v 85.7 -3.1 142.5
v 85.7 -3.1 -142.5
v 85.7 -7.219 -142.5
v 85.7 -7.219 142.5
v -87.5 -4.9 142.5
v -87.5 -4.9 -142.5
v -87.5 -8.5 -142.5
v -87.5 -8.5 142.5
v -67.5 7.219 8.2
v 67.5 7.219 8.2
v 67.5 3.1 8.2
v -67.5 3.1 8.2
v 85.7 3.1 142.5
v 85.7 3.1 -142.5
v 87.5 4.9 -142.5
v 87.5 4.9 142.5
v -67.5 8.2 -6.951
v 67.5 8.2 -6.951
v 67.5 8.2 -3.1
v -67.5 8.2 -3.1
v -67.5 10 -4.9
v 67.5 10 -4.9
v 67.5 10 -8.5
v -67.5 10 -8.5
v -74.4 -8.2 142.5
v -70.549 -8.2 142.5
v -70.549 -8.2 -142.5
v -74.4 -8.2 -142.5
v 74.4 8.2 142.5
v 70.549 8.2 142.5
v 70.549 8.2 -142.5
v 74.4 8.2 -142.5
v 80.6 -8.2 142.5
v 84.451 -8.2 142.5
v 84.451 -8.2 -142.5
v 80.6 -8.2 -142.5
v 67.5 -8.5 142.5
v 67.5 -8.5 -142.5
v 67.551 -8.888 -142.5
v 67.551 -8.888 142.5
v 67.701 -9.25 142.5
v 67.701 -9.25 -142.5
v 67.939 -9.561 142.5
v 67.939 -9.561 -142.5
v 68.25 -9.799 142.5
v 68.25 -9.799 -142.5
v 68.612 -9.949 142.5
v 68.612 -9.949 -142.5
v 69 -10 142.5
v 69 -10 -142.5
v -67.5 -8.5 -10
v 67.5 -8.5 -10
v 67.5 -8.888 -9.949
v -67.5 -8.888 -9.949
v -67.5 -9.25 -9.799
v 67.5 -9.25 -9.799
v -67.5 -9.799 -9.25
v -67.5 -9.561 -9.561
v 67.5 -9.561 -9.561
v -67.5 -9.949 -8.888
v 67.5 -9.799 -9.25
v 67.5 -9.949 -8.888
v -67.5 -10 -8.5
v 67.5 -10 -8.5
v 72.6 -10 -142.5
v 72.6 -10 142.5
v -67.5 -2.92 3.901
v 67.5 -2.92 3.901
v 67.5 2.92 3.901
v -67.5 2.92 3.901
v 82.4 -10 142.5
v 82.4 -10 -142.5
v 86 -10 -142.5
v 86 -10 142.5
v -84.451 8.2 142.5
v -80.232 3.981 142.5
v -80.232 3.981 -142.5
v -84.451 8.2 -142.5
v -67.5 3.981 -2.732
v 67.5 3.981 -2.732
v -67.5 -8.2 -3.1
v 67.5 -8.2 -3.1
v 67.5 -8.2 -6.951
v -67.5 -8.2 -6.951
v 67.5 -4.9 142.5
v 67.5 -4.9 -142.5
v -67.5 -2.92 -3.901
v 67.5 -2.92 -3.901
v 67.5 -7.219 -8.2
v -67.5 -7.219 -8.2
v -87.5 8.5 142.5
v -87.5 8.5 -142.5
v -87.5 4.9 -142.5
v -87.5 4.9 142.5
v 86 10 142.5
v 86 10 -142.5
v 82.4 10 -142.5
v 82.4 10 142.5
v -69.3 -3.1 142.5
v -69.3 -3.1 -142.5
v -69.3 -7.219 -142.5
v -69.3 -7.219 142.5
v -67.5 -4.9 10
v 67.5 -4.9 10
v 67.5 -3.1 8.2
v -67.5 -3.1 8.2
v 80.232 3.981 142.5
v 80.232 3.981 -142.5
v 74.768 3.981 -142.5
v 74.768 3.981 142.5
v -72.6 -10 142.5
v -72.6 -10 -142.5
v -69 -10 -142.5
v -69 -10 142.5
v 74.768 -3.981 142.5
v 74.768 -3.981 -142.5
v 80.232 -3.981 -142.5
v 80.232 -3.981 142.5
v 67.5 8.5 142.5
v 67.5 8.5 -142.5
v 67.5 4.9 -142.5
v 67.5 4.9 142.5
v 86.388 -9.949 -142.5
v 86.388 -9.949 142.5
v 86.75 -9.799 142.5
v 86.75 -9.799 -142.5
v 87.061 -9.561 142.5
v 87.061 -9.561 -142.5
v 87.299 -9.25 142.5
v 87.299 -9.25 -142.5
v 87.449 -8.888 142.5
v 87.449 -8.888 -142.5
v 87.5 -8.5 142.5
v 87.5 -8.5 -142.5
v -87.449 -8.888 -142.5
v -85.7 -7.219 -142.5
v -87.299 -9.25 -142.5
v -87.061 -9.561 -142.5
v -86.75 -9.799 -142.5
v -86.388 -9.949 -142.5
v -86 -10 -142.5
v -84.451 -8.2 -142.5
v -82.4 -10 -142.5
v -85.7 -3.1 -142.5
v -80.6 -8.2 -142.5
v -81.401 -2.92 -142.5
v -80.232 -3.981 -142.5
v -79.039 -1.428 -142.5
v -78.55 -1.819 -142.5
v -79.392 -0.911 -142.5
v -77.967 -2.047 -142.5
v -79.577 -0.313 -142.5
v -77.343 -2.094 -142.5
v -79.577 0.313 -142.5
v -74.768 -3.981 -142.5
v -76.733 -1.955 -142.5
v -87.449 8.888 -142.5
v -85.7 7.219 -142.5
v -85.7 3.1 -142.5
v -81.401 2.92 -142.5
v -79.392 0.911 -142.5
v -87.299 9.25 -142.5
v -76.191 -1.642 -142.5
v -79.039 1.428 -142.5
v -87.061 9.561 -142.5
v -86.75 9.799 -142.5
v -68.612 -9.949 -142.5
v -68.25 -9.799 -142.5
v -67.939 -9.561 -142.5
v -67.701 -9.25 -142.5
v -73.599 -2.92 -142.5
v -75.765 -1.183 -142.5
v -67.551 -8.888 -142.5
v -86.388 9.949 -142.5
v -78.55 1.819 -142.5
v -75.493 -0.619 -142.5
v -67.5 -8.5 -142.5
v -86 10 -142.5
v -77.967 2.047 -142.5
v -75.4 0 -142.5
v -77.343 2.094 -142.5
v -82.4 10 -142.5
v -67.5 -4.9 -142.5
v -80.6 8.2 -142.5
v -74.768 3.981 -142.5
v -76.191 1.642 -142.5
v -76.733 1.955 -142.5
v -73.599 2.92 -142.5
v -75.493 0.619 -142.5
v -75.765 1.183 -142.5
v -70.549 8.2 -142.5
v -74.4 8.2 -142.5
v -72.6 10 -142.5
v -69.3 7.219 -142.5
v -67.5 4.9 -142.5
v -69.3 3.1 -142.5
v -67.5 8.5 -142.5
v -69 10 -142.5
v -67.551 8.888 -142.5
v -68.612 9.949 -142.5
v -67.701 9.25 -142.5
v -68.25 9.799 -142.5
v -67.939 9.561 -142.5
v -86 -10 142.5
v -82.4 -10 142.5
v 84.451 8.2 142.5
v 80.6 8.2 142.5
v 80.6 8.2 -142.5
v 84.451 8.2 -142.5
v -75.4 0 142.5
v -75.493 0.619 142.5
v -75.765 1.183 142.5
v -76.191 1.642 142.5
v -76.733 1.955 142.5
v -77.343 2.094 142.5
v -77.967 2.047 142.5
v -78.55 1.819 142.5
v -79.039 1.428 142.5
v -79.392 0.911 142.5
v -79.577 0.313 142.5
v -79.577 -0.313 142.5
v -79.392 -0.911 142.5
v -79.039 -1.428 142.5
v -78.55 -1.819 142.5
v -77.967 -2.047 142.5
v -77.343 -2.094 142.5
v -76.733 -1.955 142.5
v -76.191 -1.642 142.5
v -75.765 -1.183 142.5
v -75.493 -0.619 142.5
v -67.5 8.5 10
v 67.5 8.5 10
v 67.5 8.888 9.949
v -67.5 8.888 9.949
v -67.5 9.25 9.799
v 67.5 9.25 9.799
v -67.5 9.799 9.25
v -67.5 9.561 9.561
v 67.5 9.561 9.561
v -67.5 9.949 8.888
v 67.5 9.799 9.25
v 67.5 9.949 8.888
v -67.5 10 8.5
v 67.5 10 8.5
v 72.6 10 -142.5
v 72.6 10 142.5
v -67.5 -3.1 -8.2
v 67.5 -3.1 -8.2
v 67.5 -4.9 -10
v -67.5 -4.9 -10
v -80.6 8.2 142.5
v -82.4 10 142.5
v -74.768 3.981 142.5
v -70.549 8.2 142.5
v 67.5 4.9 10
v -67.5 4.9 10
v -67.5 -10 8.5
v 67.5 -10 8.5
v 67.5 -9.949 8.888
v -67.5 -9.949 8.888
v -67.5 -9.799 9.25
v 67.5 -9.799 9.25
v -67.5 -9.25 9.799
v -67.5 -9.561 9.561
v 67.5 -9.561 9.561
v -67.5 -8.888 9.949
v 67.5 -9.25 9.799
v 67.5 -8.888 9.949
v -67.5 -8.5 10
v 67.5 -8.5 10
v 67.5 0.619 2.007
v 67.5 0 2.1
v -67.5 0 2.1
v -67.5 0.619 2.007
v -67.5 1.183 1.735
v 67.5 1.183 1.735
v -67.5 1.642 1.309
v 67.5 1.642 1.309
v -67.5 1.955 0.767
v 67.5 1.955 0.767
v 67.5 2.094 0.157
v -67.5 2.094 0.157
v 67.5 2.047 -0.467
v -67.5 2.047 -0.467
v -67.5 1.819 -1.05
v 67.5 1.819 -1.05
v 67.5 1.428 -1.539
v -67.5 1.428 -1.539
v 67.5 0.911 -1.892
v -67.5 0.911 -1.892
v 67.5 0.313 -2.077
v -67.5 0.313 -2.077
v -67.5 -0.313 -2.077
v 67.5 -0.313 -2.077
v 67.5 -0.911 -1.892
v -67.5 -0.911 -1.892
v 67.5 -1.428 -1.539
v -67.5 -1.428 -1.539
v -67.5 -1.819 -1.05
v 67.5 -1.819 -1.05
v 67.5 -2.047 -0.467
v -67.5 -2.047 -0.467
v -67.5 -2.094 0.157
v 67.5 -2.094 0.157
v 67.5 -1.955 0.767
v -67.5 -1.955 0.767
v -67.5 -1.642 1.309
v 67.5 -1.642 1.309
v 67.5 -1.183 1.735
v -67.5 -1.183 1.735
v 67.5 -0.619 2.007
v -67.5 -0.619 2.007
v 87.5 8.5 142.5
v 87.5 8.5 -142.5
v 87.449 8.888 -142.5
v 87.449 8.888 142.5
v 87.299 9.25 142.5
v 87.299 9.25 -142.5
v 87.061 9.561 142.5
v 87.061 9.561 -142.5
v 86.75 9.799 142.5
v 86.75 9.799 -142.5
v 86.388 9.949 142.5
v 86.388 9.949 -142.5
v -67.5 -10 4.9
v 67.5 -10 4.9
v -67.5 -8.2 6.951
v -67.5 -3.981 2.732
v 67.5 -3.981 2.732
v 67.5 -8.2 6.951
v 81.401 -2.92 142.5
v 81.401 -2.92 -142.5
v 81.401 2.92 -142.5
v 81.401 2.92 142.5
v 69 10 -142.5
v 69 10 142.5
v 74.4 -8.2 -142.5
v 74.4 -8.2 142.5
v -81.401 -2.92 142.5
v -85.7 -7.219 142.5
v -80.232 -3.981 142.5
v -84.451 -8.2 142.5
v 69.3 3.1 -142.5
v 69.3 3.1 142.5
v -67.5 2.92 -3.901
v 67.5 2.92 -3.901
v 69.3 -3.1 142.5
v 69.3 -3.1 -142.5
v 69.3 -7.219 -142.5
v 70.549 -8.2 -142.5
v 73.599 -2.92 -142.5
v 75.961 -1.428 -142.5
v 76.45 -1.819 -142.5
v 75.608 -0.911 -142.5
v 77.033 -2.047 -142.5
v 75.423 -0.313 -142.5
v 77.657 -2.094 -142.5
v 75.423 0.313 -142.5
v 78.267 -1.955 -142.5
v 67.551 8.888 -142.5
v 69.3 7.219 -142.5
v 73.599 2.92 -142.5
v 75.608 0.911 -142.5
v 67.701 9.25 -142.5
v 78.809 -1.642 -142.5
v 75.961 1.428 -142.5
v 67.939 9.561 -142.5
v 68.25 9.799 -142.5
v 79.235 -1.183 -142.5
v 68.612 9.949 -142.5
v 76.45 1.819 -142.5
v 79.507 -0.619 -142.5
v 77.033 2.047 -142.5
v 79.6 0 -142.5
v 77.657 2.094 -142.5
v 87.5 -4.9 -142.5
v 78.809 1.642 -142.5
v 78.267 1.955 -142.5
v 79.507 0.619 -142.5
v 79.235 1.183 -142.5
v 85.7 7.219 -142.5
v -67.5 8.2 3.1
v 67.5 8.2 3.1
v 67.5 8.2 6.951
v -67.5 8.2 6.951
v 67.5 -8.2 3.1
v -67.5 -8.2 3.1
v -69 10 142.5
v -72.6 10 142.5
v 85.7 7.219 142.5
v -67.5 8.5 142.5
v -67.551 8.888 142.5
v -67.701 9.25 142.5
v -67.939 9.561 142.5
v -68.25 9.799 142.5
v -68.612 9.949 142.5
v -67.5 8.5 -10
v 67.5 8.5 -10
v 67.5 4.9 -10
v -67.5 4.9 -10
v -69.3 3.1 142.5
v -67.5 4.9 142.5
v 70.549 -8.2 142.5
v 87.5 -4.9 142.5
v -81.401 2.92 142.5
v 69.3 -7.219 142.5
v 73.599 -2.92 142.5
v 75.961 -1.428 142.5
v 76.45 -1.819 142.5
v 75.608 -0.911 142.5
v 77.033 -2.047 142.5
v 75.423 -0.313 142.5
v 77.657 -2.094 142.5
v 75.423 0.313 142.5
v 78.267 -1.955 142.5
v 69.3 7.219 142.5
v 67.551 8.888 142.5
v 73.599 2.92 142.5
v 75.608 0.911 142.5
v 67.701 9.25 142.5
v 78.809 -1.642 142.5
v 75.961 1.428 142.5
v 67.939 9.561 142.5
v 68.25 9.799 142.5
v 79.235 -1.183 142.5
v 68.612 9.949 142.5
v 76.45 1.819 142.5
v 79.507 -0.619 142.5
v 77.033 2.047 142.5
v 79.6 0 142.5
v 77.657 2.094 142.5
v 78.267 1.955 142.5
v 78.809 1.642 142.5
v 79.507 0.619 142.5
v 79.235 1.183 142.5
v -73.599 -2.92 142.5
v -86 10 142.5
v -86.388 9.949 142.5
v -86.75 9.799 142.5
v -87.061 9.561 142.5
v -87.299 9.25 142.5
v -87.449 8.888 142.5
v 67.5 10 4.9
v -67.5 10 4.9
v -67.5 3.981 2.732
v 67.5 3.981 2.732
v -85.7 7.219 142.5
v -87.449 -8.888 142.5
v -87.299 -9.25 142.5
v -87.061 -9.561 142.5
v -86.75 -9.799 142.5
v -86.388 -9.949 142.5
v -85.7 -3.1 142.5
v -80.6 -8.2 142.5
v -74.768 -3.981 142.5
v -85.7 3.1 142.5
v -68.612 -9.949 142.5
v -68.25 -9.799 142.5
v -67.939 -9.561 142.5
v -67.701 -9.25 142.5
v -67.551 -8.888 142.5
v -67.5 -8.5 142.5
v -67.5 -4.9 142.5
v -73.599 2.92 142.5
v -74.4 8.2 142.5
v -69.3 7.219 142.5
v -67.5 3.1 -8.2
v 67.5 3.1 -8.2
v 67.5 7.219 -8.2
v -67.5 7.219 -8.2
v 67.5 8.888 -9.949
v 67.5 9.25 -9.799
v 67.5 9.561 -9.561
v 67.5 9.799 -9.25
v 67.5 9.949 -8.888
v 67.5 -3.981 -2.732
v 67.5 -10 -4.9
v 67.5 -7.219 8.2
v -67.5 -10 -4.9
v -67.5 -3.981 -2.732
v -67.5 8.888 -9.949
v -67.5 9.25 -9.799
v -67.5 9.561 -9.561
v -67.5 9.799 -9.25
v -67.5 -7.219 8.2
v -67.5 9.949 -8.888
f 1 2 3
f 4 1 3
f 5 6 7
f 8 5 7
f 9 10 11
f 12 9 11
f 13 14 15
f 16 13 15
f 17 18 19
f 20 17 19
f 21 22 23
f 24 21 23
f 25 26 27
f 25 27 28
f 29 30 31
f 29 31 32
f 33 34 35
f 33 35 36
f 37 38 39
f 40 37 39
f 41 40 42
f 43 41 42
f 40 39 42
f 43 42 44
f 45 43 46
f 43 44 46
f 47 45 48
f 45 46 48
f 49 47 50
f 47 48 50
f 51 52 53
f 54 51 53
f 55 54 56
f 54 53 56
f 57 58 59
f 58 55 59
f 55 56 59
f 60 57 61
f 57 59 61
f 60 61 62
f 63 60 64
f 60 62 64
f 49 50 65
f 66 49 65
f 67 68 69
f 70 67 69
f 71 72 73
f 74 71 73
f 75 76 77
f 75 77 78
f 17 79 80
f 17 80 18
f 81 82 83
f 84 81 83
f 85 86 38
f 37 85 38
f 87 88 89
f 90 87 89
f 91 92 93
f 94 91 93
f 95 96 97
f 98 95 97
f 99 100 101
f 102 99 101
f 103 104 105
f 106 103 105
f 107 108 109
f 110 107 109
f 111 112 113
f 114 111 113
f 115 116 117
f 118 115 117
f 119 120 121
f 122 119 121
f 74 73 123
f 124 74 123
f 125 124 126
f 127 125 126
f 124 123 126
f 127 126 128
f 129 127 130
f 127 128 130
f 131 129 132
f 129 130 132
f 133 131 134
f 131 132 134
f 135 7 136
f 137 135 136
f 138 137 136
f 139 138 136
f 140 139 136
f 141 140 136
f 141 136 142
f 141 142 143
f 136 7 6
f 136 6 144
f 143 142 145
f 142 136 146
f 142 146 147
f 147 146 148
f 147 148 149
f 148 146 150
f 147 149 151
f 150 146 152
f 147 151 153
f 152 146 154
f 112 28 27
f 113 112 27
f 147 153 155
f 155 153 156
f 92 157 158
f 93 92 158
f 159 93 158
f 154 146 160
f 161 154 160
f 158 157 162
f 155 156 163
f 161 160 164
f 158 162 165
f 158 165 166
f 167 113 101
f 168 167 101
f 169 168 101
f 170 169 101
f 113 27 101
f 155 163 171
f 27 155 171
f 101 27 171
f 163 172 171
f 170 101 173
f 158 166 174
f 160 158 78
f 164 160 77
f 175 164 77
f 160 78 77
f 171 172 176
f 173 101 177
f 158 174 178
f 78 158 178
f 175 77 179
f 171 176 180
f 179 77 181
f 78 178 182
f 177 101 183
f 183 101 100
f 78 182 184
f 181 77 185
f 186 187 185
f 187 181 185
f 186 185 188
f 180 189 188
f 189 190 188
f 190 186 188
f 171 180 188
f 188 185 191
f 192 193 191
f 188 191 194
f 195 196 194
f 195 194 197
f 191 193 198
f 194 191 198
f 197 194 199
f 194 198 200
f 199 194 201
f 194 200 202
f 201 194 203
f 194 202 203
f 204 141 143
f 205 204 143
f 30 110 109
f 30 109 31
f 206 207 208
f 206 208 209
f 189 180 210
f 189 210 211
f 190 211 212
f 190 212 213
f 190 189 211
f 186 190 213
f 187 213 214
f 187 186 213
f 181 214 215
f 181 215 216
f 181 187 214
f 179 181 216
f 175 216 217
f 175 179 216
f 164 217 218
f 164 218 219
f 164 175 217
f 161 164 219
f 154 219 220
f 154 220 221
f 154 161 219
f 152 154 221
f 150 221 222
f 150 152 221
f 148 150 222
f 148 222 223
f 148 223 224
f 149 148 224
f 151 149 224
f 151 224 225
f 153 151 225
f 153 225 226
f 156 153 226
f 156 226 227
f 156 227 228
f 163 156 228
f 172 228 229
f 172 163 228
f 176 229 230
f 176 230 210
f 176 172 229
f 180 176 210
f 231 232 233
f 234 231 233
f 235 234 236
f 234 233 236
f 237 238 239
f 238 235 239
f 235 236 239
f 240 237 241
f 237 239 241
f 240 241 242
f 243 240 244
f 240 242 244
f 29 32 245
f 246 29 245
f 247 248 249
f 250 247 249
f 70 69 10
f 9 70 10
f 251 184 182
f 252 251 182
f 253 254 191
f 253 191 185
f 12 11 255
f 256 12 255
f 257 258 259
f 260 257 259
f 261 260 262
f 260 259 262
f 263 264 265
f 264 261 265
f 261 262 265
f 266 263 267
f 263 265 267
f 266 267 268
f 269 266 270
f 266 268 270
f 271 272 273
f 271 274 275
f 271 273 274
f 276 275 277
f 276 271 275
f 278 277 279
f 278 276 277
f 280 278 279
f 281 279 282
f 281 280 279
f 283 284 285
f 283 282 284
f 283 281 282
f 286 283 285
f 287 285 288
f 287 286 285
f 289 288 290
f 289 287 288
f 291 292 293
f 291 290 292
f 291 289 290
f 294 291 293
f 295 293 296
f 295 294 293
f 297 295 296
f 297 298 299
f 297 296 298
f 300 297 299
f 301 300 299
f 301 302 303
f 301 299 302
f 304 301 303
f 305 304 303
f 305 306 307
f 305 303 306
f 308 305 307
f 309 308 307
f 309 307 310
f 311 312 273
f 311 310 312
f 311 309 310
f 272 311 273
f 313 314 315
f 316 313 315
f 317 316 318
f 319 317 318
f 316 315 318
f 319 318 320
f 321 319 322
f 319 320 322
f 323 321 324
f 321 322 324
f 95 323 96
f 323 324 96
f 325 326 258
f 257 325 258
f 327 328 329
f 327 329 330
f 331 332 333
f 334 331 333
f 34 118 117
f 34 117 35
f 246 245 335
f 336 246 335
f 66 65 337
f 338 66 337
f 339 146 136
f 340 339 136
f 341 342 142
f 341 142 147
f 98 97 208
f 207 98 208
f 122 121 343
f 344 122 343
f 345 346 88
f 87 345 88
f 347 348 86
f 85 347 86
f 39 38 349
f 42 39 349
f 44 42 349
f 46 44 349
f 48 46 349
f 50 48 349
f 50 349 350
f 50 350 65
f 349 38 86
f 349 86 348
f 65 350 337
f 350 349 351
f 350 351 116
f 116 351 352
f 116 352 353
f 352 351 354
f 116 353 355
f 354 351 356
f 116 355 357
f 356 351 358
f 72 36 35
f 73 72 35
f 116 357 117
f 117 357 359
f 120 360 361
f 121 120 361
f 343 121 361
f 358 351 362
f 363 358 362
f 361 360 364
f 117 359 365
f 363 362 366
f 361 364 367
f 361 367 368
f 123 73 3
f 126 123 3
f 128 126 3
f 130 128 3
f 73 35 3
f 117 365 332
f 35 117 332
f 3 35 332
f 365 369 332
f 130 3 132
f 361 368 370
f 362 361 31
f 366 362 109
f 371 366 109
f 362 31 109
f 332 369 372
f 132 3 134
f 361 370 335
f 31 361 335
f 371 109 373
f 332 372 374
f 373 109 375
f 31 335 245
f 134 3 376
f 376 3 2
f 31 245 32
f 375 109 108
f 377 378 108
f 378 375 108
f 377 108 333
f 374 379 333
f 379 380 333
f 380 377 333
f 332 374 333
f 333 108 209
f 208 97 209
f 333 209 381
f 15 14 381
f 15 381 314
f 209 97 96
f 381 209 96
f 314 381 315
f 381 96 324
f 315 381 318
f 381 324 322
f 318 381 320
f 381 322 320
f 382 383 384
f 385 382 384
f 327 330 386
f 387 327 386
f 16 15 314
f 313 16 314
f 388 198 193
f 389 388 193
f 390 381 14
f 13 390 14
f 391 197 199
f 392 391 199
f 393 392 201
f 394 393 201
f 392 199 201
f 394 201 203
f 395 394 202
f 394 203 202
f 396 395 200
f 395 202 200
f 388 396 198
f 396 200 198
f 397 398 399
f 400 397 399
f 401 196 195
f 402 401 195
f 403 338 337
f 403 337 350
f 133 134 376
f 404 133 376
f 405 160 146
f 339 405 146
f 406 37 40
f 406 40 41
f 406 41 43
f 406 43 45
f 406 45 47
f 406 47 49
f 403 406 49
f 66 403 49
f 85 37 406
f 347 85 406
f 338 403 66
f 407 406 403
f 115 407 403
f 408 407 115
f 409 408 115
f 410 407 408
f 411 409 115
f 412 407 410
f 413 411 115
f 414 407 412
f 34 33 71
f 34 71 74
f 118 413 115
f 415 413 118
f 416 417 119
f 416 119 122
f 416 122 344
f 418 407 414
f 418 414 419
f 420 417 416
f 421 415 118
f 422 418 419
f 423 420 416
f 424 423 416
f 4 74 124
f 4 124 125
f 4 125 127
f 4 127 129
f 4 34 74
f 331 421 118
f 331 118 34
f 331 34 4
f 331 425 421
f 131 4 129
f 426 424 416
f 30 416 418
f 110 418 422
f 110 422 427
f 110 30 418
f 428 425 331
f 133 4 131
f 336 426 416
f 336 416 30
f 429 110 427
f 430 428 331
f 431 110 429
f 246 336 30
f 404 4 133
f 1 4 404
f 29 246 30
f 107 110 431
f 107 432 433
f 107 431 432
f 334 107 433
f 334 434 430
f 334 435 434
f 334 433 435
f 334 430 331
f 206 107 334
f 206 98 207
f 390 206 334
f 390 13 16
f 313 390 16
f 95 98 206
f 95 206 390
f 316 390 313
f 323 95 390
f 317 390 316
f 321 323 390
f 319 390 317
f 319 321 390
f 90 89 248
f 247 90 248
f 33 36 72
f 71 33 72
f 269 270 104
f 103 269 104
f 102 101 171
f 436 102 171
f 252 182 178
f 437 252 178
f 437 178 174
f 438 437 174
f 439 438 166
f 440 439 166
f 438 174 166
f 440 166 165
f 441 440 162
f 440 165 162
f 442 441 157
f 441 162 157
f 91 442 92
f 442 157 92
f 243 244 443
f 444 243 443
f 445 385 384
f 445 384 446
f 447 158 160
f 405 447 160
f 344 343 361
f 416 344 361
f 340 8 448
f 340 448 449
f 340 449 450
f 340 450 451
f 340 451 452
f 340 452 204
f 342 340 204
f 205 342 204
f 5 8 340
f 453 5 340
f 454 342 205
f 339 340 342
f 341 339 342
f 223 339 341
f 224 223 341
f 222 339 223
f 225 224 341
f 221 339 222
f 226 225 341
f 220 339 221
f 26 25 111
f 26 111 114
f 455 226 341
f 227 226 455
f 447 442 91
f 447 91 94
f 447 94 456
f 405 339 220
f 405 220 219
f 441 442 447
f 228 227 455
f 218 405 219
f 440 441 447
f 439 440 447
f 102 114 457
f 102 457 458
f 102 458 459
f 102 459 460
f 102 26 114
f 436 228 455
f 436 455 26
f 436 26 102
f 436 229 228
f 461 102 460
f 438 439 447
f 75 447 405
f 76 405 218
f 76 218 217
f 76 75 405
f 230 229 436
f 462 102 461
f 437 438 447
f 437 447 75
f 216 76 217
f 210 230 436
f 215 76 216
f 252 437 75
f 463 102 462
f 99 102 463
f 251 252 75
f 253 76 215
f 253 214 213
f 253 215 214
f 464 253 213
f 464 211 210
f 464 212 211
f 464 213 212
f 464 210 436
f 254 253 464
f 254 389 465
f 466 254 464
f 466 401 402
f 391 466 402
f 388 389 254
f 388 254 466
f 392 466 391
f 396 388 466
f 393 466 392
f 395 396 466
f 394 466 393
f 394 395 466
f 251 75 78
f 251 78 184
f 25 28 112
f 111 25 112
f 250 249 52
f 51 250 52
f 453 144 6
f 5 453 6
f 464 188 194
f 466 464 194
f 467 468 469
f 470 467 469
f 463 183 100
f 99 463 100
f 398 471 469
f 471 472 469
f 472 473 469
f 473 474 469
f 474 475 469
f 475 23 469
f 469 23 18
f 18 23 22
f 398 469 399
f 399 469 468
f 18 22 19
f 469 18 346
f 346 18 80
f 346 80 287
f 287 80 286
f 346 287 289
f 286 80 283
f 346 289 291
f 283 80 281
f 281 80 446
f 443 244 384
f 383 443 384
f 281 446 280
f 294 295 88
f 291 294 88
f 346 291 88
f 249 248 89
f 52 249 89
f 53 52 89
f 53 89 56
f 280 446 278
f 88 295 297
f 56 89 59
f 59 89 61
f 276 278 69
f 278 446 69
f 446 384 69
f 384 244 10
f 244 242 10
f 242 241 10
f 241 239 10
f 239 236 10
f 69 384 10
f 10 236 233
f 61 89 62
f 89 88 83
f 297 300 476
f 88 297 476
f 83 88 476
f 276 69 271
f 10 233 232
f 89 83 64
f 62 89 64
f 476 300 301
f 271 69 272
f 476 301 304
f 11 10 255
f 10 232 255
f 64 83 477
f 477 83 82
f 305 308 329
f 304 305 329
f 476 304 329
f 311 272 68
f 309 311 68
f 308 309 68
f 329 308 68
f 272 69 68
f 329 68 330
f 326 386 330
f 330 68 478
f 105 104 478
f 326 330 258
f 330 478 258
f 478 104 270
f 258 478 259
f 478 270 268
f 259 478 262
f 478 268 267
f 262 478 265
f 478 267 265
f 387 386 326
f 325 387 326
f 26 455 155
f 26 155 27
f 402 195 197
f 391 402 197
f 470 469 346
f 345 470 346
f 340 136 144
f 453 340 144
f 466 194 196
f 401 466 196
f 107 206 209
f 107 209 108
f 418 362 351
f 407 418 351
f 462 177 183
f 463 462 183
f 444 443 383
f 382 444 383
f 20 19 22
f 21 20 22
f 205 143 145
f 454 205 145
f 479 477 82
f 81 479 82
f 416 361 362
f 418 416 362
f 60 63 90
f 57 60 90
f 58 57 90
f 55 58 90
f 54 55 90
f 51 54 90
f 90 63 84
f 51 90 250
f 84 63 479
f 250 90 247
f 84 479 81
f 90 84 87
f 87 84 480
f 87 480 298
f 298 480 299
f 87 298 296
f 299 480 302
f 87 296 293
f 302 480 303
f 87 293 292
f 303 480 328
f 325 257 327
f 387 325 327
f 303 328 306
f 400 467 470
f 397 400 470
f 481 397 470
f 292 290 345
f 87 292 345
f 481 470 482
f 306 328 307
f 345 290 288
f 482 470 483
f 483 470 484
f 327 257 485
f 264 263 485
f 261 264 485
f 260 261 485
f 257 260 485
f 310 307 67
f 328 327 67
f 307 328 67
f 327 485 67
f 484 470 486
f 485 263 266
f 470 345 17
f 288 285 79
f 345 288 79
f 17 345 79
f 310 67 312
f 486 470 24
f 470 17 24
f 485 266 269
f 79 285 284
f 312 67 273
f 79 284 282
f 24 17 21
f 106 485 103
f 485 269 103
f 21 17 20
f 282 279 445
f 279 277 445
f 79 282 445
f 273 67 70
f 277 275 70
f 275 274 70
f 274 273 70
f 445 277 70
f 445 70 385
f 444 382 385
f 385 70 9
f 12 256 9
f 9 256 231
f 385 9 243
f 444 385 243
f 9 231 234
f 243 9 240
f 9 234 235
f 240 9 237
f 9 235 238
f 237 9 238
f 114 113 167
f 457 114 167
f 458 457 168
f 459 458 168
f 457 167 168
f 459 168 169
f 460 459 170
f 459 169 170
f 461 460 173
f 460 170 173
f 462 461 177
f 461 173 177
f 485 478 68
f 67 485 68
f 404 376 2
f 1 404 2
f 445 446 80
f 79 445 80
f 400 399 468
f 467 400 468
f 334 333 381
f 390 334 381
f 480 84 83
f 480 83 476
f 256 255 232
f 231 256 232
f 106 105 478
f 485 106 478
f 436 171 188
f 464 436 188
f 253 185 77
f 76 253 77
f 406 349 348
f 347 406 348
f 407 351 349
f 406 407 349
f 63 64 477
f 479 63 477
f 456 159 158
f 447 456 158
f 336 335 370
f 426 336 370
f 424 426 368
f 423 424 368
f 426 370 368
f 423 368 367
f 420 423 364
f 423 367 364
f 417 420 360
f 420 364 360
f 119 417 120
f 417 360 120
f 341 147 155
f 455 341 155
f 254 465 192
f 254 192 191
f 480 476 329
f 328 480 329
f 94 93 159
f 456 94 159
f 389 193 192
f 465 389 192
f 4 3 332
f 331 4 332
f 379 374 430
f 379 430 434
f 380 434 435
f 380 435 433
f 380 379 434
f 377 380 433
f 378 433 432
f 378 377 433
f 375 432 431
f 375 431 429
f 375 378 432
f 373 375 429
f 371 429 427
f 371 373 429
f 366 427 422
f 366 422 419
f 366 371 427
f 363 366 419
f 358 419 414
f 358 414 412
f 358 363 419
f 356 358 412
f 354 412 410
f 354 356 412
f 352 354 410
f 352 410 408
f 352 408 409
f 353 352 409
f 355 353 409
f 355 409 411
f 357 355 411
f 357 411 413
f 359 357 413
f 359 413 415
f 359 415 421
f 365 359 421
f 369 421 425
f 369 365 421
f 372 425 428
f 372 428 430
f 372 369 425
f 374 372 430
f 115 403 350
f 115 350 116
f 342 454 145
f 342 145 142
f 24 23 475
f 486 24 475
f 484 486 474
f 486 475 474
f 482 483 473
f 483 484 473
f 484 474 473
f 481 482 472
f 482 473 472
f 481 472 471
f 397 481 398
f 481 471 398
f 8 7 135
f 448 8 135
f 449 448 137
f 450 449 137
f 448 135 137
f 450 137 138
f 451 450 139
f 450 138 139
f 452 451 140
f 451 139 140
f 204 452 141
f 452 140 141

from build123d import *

# Parameters (mm, degrees)
SKETCH11_R                         = 2.1
ALUMINIUM_EXTRUSION_2020_1_DEPTH   = 285
SKETCH11_ON_SEGMENT_2_R            = 2.1
ALUMINIUM_EXTRUSION_2020_1_2_DEPTH = 285
SKETCH11_ON_SEGMENT_3_R            = 2.1
ALUMINIUM_EXTRUSION_2020_1_3_DEPTH = 157


with BuildPart() as part:
    # Sketch11 → Aluminium extrusion 2020(1) (new body)
    with BuildSketch(Plane(origin=(-77.5, 0, -142.5), x_dir=(1, 0, 0), z_dir=(0, 0, 1))):
        with BuildLine():
            Line((-2.731536985, 3.980660172), (-6.950876813, 8.2))
            Line((-6.950876813, 8.2), (-3.1, 8.2))
            Line((-3.1, 8.2), (-4.9, 10))
            Line((-4.9, 10), (-8.5, 10))
            ThreePointArc((-8.5, 10), (-9.560660172, 9.560660172), (-10, 8.5))
            Line((-10, 8.5), (-10, 4.9))
            Line((-10, 4.9), (-8.2, 3.1))
            Line((-8.2, 3.1), (-8.2, 7.219339828))
            Line((-8.2, 7.219339828), (-3.900660172, 2.92))
            Line((-3.900660172, 2.92), (-3.900660172, -2.92))
            Line((-3.900660172, -2.92), (-8.2, -7.219339828))
            Line((-8.2, -7.219339828), (-8.2, -3.1))
            Line((-8.2, -3.1), (-10, -4.9))
            Line((-10, -4.9), (-10, -8.5))
            ThreePointArc((-10, -8.5), (-9.560660172, -9.560660172), (-8.5, -10))
            Line((-8.5, -10), (-4.9, -10))
            Line((-4.9, -10), (-3.1, -8.2))
            Line((-3.1, -8.2), (-6.950876813, -8.2))
            Line((-6.950876813, -8.2), (-2.731536985, -3.980660172))
            Line((-2.731536985, -3.980660172), (2.731536985, -3.980660172))
            Line((2.731536985, -3.980660172), (6.950876813, -8.2))
            Line((6.950876813, -8.2), (3.1, -8.2))
            Line((3.1, -8.2), (4.9, -10))
            Line((4.9, -10), (8.5, -10))
            ThreePointArc((8.5, -10), (9.560660172, -9.560660172), (10, -8.5))
            Line((10, -8.5), (10, -4.9))
            Line((10, -4.9), (8.2, -3.1))
            Line((8.2, -3.1), (8.2, -7.219339828))
            Line((8.2, -7.219339828), (3.900660172, -2.92))
            Line((3.900660172, -2.92), (3.900660172, 2.92))
            Line((3.900660172, 2.92), (8.2, 7.219339828))
            Line((8.2, 7.219339828), (8.2, 3.1))
            Line((8.2, 3.1), (10, 4.9))
            Line((10, 4.9), (10, 8.5))
            ThreePointArc((10, 8.5), (9.560660172, 9.560660172), (8.5, 10))
            Line((8.5, 10), (4.9, 10))
            Line((4.9, 10), (3.1, 8.2))
            Line((3.1, 8.2), (6.950876813, 8.2))
            Line((6.950876813, 8.2), (2.731536985, 3.980660172))
            Line((2.731536985, 3.980660172), (-2.731536985, 3.980660172))
        make_face()
        Circle(SKETCH11_R, mode=Mode.SUBTRACT)
    extrude(amount=ALUMINIUM_EXTRUSION_2020_1_DEPTH)


with BuildPart() as body_2:
    # Sketch11 on segment 2 (carried to segment 2) → Aluminium extrusion 2020_1 2 (new body)
    with BuildSketch(Plane(origin=(77.5, 0, -142.5), x_dir=(1, 0, 0), z_dir=(0, 0, 1))):
        with BuildLine():
            Line((-2.731536985, 3.980660172), (-6.950876813, 8.2))
            Line((-6.950876813, 8.2), (-3.1, 8.2))
            Line((-3.1, 8.2), (-4.9, 10))
            Line((-4.9, 10), (-8.5, 10))
            ThreePointArc((-8.5, 10), (-9.560660172, 9.560660172), (-10, 8.5))
            Line((-10, 8.5), (-10, 4.9))
            Line((-10, 4.9), (-8.2, 3.1))
            Line((-8.2, 3.1), (-8.2, 7.219339828))
            Line((-8.2, 7.219339828), (-3.900660172, 2.92))
            Line((-3.900660172, 2.92), (-3.900660172, -2.92))
            Line((-3.900660172, -2.92), (-8.2, -7.219339828))
            Line((-8.2, -7.219339828), (-8.2, -3.1))
            Line((-8.2, -3.1), (-10, -4.9))
            Line((-10, -4.9), (-10, -8.5))
            ThreePointArc((-10, -8.5), (-9.560660172, -9.560660172), (-8.5, -10))
            Line((-8.5, -10), (-4.9, -10))
            Line((-4.9, -10), (-3.1, -8.2))
            Line((-3.1, -8.2), (-6.950876813, -8.2))
            Line((-6.950876813, -8.2), (-2.731536985, -3.980660172))
            Line((-2.731536985, -3.980660172), (2.731536985, -3.980660172))
            Line((2.731536985, -3.980660172), (6.950876813, -8.2))
            Line((6.950876813, -8.2), (3.1, -8.2))
            Line((3.1, -8.2), (4.9, -10))
            Line((4.9, -10), (8.5, -10))
            ThreePointArc((8.5, -10), (9.560660172, -9.560660172), (10, -8.5))
            Line((10, -8.5), (10, -4.9))
            Line((10, -4.9), (8.2, -3.1))
            Line((8.2, -3.1), (8.2, -7.219339828))
            Line((8.2, -7.219339828), (3.900660172, -2.92))
            Line((3.900660172, -2.92), (3.900660172, 2.92))
            Line((3.900660172, 2.92), (8.2, 7.219339828))
            Line((8.2, 7.219339828), (8.2, 3.1))
            Line((8.2, 3.1), (10, 4.9))
            Line((10, 4.9), (10, 8.5))
            ThreePointArc((10, 8.5), (9.560660172, 9.560660172), (8.5, 10))
            Line((8.5, 10), (4.9, 10))
            Line((4.9, 10), (3.1, 8.2))
            Line((3.1, 8.2), (6.950876813, 8.2))
            Line((6.950876813, 8.2), (2.731536985, 3.980660172))
            Line((2.731536985, 3.980660172), (-2.731536985, 3.980660172))
        make_face()
        Circle(SKETCH11_ON_SEGMENT_2_R, mode=Mode.SUBTRACT)
    extrude(amount=ALUMINIUM_EXTRUSION_2020_1_2_DEPTH)


with BuildPart() as body_3:
    # Sketch11 on segment 3 (carried to segment 3) → Aluminium extrusion 2020_1 3 (new body)
    with BuildSketch(Plane.ZY.offset(-78.5)):
        with BuildLine():
            Line((-2.731536985, 3.980660172), (-6.950876813, 8.2))
            Line((-6.950876813, 8.2), (-3.1, 8.2))
            Line((-3.1, 8.2), (-4.9, 10))
            Line((-4.9, 10), (-8.5, 10))
            ThreePointArc((-8.5, 10), (-9.560660172, 9.560660172), (-10, 8.5))
            Line((-10, 8.5), (-10, 4.9))
            Line((-10, 4.9), (-8.2, 3.1))
            Line((-8.2, 3.1), (-8.2, 7.219339828))
            Line((-8.2, 7.219339828), (-3.900660172, 2.92))
            Line((-3.900660172, 2.92), (-3.900660172, -2.92))
            Line((-3.900660172, -2.92), (-8.2, -7.219339828))
            Line((-8.2, -7.219339828), (-8.2, -3.1))
            Line((-8.2, -3.1), (-10, -4.9))
            Line((-10, -4.9), (-10, -8.5))
            ThreePointArc((-10, -8.5), (-9.560660172, -9.560660172), (-8.5, -10))
            Line((-8.5, -10), (-4.9, -10))
            Line((-4.9, -10), (-3.1, -8.2))
            Line((-3.1, -8.2), (-6.950876813, -8.2))
            Line((-6.950876813, -8.2), (-2.731536985, -3.980660172))
            Line((-2.731536985, -3.980660172), (2.731536985, -3.980660172))
            Line((2.731536985, -3.980660172), (6.950876813, -8.2))
            Line((6.950876813, -8.2), (3.1, -8.2))
            Line((3.1, -8.2), (4.9, -10))
            Line((4.9, -10), (8.5, -10))
            ThreePointArc((8.5, -10), (9.560660172, -9.560660172), (10, -8.5))
            Line((10, -8.5), (10, -4.9))
            Line((10, -4.9), (8.2, -3.1))
            Line((8.2, -3.1), (8.2, -7.219339828))
            Line((8.2, -7.219339828), (3.900660172, -2.92))
            Line((3.900660172, -2.92), (3.900660172, 2.92))
            Line((3.900660172, 2.92), (8.2, 7.219339828))
            Line((8.2, 7.219339828), (8.2, 3.1))
            Line((8.2, 3.1), (10, 4.9))
            Line((10, 4.9), (10, 8.5))
            ThreePointArc((10, 8.5), (9.560660172, 9.560660172), (8.5, 10))
            Line((8.5, 10), (4.9, 10))
            Line((4.9, 10), (3.1, 8.2))
            Line((3.1, 8.2), (6.950876813, 8.2))
            Line((6.950876813, 8.2), (2.731536985, 3.980660172))
            Line((2.731536985, 3.980660172), (-2.731536985, 3.980660172))
        make_face()
        Circle(SKETCH11_ON_SEGMENT_3_R, mode=Mode.SUBTRACT)
    extrude(amount=ALUMINIUM_EXTRUSION_2020_1_3_DEPTH)

    # Aluminium extrusion 2020_1 3 end butt 1
    split(bisect_by=Plane(origin=(67.5, 0, 0), x_dir=(0, -1, 0), z_dir=(-1, 0, 0)), keep=Keep.TOP)

    # Aluminium extrusion 2020_1 3 end butt 2
    split(bisect_by=Plane.YZ.offset(-67.5), keep=Keep.TOP)


solid = Compound([part.part, body_2.part, body_3.part])
